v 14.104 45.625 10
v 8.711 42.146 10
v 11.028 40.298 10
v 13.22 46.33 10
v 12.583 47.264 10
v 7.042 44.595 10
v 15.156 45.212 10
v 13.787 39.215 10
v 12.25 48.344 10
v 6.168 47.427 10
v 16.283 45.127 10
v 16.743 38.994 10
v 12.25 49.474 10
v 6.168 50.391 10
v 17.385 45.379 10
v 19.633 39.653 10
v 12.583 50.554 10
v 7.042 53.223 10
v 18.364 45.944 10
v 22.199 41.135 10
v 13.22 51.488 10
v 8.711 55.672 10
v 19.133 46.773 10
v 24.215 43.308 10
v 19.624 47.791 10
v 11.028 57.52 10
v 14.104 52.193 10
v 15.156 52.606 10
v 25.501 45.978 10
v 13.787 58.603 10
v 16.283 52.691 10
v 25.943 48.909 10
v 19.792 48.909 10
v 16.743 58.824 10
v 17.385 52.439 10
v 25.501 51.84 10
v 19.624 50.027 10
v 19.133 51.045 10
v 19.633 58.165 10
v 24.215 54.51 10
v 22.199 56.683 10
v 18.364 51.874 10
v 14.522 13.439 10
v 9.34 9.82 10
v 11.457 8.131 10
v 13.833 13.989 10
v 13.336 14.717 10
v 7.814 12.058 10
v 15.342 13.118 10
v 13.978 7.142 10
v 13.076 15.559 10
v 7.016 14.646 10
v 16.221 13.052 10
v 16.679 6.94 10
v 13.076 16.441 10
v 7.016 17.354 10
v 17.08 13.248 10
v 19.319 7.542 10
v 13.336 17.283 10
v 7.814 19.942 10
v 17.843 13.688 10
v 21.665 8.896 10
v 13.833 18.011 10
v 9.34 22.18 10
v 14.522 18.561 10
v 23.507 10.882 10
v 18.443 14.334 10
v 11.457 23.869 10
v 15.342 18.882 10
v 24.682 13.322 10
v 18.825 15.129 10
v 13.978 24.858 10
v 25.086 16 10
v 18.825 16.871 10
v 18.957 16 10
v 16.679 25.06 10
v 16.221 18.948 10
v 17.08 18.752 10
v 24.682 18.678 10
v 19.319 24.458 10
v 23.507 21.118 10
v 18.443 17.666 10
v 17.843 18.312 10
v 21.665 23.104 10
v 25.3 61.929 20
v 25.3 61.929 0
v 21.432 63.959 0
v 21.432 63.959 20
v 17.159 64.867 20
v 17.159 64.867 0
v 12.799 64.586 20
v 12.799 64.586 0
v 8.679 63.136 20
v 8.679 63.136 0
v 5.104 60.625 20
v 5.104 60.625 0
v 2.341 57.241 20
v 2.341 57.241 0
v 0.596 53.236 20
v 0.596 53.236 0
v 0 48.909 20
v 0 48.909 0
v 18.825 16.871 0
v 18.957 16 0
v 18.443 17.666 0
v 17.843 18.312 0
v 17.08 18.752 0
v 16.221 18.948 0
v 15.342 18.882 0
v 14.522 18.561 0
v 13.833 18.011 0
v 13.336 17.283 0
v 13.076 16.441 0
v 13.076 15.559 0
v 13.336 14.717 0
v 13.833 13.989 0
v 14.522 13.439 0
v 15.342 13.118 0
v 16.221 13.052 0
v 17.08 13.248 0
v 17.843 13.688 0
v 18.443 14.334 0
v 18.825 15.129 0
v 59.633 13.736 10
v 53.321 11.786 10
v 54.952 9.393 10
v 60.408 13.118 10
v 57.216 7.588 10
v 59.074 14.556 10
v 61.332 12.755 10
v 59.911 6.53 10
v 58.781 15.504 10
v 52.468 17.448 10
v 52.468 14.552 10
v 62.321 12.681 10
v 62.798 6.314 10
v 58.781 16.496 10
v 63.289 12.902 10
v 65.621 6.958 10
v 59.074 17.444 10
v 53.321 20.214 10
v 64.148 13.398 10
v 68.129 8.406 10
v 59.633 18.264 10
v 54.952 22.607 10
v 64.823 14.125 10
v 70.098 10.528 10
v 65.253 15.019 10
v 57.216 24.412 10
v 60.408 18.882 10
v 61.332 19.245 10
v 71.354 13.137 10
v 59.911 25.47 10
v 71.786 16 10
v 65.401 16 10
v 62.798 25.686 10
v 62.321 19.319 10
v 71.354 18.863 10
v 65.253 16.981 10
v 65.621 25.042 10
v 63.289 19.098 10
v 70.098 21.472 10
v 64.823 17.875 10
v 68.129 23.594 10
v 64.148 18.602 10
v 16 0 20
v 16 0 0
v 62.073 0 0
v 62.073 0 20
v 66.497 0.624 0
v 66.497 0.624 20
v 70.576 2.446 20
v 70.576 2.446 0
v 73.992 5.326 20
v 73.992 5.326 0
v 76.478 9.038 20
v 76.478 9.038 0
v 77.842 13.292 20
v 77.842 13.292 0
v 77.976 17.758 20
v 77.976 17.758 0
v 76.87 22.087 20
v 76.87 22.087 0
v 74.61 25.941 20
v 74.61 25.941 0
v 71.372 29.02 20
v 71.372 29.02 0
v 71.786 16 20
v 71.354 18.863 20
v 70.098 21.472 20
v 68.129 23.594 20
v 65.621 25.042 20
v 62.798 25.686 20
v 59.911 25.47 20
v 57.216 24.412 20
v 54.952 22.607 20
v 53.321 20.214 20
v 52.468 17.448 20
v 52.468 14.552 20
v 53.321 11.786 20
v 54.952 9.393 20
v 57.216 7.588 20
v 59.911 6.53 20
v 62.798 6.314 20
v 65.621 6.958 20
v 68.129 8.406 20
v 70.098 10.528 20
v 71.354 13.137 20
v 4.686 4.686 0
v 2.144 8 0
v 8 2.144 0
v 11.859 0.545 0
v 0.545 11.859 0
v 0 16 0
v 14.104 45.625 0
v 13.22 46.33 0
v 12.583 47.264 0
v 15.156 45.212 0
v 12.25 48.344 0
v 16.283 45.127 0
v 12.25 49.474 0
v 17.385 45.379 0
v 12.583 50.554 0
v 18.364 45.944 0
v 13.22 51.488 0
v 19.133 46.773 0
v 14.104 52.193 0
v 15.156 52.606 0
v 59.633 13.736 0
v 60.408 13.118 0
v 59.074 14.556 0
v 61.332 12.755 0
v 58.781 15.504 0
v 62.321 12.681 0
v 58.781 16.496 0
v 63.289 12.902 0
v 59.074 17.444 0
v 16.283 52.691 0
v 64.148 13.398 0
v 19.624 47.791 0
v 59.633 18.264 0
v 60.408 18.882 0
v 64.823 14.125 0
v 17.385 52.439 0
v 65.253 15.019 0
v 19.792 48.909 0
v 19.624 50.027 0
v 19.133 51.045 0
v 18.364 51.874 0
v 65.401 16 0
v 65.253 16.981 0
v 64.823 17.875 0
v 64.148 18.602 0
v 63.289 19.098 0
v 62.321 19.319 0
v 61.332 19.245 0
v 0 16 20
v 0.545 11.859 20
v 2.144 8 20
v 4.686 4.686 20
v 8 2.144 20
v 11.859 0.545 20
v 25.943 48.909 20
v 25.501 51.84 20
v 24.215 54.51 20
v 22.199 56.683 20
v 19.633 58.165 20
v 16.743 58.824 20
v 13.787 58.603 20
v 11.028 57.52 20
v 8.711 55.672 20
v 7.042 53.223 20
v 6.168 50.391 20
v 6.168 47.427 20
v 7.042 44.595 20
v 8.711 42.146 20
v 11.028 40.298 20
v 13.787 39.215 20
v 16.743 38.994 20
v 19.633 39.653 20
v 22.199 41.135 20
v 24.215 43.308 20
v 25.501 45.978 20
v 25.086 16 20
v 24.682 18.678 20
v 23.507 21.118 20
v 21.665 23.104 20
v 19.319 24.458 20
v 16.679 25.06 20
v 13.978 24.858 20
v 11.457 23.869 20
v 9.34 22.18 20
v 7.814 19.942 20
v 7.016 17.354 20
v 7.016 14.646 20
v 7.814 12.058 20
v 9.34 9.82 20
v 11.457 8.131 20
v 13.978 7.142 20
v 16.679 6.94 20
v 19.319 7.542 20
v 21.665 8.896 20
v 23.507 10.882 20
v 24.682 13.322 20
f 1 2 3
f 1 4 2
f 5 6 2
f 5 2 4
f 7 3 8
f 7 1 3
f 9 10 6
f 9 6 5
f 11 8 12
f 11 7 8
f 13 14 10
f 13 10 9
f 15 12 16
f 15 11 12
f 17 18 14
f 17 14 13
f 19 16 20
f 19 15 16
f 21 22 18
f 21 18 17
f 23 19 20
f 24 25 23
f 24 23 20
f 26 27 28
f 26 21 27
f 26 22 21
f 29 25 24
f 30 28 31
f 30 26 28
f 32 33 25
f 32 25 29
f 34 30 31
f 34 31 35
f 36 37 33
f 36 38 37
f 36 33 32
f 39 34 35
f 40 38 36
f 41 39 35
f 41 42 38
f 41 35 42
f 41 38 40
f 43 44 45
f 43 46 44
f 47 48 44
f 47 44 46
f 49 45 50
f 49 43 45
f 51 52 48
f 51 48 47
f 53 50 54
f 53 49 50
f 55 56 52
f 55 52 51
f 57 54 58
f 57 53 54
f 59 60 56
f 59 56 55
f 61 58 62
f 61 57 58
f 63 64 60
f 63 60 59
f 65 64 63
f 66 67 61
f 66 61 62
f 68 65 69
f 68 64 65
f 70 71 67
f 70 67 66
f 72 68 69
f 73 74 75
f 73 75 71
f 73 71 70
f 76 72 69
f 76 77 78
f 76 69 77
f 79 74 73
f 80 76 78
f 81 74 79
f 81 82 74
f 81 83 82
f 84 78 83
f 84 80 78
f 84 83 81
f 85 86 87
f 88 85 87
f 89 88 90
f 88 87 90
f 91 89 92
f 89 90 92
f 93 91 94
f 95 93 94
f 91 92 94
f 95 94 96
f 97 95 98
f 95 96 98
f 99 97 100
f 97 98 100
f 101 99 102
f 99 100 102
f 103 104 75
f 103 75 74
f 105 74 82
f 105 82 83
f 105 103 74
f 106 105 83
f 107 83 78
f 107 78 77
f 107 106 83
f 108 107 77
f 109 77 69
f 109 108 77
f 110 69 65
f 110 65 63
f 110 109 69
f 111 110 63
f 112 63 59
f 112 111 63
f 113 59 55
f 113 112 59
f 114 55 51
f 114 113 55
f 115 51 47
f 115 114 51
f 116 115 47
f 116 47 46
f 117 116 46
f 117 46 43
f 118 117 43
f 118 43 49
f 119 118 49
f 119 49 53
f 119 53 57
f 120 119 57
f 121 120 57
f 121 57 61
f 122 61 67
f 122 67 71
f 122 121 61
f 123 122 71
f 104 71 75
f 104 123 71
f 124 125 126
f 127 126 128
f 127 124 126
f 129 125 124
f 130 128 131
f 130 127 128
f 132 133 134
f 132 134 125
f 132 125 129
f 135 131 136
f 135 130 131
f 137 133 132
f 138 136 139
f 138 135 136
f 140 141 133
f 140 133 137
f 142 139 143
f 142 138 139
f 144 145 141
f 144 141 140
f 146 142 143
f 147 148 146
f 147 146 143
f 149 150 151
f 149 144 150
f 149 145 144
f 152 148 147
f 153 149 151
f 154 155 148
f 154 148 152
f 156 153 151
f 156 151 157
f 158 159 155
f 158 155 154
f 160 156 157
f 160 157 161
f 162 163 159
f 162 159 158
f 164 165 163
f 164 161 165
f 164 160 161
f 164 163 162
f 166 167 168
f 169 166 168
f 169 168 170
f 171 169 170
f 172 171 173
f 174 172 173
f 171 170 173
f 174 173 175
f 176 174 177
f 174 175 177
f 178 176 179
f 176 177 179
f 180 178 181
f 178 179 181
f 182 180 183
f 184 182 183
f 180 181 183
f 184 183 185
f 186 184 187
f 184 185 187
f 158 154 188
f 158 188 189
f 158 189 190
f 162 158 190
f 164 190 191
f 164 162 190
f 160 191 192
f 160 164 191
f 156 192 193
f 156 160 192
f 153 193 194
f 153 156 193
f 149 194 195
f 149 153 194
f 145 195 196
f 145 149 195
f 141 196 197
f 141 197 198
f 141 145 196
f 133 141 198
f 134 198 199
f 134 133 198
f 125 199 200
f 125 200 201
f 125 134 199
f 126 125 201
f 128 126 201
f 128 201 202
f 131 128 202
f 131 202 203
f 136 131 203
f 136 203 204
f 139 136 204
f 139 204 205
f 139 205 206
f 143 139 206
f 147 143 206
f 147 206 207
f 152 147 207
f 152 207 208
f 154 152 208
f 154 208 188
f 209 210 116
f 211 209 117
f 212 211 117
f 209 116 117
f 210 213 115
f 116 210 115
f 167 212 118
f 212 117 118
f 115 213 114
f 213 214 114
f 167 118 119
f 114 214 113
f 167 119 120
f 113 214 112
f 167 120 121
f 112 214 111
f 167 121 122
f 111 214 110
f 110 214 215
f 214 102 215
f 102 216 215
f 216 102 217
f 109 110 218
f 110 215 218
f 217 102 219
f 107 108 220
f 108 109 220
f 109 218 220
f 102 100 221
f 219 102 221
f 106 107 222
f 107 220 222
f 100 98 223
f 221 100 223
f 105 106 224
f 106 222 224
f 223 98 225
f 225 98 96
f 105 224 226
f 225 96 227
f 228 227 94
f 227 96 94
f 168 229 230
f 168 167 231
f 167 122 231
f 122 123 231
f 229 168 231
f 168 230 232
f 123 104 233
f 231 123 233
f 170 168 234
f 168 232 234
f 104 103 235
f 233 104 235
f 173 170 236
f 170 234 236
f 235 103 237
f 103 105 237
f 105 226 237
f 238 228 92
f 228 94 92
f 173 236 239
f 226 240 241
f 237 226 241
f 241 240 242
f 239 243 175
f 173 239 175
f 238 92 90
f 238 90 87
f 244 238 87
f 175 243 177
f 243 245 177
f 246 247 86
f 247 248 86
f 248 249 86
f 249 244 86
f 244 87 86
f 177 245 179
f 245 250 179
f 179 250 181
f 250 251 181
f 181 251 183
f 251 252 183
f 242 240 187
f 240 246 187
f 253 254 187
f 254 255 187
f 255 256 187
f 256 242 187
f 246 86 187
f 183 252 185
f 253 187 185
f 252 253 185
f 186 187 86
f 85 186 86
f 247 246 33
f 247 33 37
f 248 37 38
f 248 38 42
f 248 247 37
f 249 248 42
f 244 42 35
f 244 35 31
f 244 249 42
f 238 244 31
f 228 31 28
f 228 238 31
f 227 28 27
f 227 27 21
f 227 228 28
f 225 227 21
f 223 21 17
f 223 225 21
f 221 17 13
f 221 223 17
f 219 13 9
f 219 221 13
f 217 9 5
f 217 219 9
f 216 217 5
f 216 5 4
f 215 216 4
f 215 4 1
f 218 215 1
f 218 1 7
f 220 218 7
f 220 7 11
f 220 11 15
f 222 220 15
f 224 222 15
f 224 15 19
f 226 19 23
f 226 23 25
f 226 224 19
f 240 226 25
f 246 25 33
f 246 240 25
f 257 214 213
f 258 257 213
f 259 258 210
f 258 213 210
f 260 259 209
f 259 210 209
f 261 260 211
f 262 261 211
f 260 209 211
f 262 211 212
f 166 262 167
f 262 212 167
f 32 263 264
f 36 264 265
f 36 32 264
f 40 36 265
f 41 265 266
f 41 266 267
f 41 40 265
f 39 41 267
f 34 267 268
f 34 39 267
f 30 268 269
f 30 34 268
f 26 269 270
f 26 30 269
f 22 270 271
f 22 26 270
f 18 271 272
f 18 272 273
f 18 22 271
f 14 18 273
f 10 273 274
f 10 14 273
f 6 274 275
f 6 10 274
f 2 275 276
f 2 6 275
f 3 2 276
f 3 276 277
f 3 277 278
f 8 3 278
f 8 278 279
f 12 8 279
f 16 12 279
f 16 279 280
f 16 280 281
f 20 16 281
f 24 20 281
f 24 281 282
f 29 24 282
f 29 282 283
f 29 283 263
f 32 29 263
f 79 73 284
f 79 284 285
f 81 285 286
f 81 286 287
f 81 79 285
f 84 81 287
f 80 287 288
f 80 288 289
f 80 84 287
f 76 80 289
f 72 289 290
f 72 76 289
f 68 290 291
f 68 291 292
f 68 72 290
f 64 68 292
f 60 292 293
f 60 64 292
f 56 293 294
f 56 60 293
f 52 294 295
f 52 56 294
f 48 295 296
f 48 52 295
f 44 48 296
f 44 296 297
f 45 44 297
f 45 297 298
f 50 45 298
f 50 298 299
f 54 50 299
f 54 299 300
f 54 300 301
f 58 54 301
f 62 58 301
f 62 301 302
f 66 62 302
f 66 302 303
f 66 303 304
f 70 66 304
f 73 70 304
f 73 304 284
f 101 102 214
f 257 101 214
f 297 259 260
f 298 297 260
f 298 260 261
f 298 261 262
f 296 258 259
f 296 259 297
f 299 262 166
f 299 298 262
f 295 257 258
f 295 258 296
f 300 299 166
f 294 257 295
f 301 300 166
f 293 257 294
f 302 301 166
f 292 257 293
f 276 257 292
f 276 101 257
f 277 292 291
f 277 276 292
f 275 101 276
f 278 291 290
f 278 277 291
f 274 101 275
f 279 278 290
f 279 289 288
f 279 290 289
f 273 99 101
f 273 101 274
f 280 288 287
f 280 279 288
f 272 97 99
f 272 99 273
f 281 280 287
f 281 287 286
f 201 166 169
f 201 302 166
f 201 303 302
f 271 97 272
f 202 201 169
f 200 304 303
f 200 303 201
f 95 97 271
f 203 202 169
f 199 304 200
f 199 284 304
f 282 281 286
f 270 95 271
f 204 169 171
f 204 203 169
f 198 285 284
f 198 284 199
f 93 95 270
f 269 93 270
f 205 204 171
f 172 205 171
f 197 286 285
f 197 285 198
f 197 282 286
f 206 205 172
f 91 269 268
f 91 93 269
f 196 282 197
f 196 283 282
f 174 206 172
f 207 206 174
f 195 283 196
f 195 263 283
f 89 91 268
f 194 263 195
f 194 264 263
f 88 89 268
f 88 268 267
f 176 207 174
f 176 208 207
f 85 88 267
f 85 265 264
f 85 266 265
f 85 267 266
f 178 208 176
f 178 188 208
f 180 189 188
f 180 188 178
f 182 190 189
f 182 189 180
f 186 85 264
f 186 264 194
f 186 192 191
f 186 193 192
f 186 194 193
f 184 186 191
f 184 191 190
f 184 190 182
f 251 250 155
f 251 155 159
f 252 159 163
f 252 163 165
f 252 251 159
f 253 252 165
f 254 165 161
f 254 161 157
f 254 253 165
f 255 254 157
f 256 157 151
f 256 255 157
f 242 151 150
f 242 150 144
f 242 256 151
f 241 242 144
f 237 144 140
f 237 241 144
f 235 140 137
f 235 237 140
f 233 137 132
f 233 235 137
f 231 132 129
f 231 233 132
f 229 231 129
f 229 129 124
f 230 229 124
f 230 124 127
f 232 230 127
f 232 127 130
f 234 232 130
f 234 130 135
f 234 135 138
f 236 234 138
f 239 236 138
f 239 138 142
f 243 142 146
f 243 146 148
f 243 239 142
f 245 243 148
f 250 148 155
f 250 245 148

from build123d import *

# Parameters (mm, degrees)
F0_R     = 9.085858
F0_R_2   = 9.713119
F0_R_3   = 9.943087
F1_DEPTH = 20
F0_R_4   = 2.956613
F0_R_5   = 3.792216
F0_R_6   = 3.328406
F2_DEPTH = 10


with BuildPart() as f1:
    # F0 (on Top) → F1 (new body)
    with BuildSketch(Plane.XY):
        with BuildLine():
            ThreePointArc((0, 16), (4.686292, 4.686292), (16, 0))
            Line((16, 0), (62.072559, 0))
            ThreePointArc((62.072559, 0), (77.309287, 11.117161), (71.37237, 29.019736))
            Line((71.37237, 29.019736), (25.299811, 61.928706))
            ThreePointArc((25.299811, 61.928706), (8.678695, 63.135653), (0, 48.908971))
            Line((0, 48.908971), (0, 16))
        make_face()
        with Locations((16, 16)):
            Circle(F0_R, mode=Mode.SUBTRACT)
        with Locations((62.072559, 16)):
            Circle(F0_R_2, mode=Mode.SUBTRACT)
        with Locations((16, 48.908971)):
            Circle(F0_R_3, mode=Mode.SUBTRACT)
    extrude(amount=F1_DEPTH)

    # F0 (on Top) → F2 (join)
    with BuildSketch(Plane.XY):
        with Locations((16, 16)):
            Circle(F0_R)
        with Locations((16, 16)):
            Circle(F0_R_4, mode=Mode.SUBTRACT)
        with Locations((16, 48.908971)):
            Circle(F0_R_3)
        with Locations((16, 48.908971)):
            Circle(F0_R_5, mode=Mode.SUBTRACT)
        with Locations((62.072559, 16)):
            Circle(F0_R_2)
        with Locations((62.072559, 16)):
            Circle(F0_R_6, mode=Mode.SUBTRACT)
    extrude(amount=F2_DEPTH)


solid = f1.part
